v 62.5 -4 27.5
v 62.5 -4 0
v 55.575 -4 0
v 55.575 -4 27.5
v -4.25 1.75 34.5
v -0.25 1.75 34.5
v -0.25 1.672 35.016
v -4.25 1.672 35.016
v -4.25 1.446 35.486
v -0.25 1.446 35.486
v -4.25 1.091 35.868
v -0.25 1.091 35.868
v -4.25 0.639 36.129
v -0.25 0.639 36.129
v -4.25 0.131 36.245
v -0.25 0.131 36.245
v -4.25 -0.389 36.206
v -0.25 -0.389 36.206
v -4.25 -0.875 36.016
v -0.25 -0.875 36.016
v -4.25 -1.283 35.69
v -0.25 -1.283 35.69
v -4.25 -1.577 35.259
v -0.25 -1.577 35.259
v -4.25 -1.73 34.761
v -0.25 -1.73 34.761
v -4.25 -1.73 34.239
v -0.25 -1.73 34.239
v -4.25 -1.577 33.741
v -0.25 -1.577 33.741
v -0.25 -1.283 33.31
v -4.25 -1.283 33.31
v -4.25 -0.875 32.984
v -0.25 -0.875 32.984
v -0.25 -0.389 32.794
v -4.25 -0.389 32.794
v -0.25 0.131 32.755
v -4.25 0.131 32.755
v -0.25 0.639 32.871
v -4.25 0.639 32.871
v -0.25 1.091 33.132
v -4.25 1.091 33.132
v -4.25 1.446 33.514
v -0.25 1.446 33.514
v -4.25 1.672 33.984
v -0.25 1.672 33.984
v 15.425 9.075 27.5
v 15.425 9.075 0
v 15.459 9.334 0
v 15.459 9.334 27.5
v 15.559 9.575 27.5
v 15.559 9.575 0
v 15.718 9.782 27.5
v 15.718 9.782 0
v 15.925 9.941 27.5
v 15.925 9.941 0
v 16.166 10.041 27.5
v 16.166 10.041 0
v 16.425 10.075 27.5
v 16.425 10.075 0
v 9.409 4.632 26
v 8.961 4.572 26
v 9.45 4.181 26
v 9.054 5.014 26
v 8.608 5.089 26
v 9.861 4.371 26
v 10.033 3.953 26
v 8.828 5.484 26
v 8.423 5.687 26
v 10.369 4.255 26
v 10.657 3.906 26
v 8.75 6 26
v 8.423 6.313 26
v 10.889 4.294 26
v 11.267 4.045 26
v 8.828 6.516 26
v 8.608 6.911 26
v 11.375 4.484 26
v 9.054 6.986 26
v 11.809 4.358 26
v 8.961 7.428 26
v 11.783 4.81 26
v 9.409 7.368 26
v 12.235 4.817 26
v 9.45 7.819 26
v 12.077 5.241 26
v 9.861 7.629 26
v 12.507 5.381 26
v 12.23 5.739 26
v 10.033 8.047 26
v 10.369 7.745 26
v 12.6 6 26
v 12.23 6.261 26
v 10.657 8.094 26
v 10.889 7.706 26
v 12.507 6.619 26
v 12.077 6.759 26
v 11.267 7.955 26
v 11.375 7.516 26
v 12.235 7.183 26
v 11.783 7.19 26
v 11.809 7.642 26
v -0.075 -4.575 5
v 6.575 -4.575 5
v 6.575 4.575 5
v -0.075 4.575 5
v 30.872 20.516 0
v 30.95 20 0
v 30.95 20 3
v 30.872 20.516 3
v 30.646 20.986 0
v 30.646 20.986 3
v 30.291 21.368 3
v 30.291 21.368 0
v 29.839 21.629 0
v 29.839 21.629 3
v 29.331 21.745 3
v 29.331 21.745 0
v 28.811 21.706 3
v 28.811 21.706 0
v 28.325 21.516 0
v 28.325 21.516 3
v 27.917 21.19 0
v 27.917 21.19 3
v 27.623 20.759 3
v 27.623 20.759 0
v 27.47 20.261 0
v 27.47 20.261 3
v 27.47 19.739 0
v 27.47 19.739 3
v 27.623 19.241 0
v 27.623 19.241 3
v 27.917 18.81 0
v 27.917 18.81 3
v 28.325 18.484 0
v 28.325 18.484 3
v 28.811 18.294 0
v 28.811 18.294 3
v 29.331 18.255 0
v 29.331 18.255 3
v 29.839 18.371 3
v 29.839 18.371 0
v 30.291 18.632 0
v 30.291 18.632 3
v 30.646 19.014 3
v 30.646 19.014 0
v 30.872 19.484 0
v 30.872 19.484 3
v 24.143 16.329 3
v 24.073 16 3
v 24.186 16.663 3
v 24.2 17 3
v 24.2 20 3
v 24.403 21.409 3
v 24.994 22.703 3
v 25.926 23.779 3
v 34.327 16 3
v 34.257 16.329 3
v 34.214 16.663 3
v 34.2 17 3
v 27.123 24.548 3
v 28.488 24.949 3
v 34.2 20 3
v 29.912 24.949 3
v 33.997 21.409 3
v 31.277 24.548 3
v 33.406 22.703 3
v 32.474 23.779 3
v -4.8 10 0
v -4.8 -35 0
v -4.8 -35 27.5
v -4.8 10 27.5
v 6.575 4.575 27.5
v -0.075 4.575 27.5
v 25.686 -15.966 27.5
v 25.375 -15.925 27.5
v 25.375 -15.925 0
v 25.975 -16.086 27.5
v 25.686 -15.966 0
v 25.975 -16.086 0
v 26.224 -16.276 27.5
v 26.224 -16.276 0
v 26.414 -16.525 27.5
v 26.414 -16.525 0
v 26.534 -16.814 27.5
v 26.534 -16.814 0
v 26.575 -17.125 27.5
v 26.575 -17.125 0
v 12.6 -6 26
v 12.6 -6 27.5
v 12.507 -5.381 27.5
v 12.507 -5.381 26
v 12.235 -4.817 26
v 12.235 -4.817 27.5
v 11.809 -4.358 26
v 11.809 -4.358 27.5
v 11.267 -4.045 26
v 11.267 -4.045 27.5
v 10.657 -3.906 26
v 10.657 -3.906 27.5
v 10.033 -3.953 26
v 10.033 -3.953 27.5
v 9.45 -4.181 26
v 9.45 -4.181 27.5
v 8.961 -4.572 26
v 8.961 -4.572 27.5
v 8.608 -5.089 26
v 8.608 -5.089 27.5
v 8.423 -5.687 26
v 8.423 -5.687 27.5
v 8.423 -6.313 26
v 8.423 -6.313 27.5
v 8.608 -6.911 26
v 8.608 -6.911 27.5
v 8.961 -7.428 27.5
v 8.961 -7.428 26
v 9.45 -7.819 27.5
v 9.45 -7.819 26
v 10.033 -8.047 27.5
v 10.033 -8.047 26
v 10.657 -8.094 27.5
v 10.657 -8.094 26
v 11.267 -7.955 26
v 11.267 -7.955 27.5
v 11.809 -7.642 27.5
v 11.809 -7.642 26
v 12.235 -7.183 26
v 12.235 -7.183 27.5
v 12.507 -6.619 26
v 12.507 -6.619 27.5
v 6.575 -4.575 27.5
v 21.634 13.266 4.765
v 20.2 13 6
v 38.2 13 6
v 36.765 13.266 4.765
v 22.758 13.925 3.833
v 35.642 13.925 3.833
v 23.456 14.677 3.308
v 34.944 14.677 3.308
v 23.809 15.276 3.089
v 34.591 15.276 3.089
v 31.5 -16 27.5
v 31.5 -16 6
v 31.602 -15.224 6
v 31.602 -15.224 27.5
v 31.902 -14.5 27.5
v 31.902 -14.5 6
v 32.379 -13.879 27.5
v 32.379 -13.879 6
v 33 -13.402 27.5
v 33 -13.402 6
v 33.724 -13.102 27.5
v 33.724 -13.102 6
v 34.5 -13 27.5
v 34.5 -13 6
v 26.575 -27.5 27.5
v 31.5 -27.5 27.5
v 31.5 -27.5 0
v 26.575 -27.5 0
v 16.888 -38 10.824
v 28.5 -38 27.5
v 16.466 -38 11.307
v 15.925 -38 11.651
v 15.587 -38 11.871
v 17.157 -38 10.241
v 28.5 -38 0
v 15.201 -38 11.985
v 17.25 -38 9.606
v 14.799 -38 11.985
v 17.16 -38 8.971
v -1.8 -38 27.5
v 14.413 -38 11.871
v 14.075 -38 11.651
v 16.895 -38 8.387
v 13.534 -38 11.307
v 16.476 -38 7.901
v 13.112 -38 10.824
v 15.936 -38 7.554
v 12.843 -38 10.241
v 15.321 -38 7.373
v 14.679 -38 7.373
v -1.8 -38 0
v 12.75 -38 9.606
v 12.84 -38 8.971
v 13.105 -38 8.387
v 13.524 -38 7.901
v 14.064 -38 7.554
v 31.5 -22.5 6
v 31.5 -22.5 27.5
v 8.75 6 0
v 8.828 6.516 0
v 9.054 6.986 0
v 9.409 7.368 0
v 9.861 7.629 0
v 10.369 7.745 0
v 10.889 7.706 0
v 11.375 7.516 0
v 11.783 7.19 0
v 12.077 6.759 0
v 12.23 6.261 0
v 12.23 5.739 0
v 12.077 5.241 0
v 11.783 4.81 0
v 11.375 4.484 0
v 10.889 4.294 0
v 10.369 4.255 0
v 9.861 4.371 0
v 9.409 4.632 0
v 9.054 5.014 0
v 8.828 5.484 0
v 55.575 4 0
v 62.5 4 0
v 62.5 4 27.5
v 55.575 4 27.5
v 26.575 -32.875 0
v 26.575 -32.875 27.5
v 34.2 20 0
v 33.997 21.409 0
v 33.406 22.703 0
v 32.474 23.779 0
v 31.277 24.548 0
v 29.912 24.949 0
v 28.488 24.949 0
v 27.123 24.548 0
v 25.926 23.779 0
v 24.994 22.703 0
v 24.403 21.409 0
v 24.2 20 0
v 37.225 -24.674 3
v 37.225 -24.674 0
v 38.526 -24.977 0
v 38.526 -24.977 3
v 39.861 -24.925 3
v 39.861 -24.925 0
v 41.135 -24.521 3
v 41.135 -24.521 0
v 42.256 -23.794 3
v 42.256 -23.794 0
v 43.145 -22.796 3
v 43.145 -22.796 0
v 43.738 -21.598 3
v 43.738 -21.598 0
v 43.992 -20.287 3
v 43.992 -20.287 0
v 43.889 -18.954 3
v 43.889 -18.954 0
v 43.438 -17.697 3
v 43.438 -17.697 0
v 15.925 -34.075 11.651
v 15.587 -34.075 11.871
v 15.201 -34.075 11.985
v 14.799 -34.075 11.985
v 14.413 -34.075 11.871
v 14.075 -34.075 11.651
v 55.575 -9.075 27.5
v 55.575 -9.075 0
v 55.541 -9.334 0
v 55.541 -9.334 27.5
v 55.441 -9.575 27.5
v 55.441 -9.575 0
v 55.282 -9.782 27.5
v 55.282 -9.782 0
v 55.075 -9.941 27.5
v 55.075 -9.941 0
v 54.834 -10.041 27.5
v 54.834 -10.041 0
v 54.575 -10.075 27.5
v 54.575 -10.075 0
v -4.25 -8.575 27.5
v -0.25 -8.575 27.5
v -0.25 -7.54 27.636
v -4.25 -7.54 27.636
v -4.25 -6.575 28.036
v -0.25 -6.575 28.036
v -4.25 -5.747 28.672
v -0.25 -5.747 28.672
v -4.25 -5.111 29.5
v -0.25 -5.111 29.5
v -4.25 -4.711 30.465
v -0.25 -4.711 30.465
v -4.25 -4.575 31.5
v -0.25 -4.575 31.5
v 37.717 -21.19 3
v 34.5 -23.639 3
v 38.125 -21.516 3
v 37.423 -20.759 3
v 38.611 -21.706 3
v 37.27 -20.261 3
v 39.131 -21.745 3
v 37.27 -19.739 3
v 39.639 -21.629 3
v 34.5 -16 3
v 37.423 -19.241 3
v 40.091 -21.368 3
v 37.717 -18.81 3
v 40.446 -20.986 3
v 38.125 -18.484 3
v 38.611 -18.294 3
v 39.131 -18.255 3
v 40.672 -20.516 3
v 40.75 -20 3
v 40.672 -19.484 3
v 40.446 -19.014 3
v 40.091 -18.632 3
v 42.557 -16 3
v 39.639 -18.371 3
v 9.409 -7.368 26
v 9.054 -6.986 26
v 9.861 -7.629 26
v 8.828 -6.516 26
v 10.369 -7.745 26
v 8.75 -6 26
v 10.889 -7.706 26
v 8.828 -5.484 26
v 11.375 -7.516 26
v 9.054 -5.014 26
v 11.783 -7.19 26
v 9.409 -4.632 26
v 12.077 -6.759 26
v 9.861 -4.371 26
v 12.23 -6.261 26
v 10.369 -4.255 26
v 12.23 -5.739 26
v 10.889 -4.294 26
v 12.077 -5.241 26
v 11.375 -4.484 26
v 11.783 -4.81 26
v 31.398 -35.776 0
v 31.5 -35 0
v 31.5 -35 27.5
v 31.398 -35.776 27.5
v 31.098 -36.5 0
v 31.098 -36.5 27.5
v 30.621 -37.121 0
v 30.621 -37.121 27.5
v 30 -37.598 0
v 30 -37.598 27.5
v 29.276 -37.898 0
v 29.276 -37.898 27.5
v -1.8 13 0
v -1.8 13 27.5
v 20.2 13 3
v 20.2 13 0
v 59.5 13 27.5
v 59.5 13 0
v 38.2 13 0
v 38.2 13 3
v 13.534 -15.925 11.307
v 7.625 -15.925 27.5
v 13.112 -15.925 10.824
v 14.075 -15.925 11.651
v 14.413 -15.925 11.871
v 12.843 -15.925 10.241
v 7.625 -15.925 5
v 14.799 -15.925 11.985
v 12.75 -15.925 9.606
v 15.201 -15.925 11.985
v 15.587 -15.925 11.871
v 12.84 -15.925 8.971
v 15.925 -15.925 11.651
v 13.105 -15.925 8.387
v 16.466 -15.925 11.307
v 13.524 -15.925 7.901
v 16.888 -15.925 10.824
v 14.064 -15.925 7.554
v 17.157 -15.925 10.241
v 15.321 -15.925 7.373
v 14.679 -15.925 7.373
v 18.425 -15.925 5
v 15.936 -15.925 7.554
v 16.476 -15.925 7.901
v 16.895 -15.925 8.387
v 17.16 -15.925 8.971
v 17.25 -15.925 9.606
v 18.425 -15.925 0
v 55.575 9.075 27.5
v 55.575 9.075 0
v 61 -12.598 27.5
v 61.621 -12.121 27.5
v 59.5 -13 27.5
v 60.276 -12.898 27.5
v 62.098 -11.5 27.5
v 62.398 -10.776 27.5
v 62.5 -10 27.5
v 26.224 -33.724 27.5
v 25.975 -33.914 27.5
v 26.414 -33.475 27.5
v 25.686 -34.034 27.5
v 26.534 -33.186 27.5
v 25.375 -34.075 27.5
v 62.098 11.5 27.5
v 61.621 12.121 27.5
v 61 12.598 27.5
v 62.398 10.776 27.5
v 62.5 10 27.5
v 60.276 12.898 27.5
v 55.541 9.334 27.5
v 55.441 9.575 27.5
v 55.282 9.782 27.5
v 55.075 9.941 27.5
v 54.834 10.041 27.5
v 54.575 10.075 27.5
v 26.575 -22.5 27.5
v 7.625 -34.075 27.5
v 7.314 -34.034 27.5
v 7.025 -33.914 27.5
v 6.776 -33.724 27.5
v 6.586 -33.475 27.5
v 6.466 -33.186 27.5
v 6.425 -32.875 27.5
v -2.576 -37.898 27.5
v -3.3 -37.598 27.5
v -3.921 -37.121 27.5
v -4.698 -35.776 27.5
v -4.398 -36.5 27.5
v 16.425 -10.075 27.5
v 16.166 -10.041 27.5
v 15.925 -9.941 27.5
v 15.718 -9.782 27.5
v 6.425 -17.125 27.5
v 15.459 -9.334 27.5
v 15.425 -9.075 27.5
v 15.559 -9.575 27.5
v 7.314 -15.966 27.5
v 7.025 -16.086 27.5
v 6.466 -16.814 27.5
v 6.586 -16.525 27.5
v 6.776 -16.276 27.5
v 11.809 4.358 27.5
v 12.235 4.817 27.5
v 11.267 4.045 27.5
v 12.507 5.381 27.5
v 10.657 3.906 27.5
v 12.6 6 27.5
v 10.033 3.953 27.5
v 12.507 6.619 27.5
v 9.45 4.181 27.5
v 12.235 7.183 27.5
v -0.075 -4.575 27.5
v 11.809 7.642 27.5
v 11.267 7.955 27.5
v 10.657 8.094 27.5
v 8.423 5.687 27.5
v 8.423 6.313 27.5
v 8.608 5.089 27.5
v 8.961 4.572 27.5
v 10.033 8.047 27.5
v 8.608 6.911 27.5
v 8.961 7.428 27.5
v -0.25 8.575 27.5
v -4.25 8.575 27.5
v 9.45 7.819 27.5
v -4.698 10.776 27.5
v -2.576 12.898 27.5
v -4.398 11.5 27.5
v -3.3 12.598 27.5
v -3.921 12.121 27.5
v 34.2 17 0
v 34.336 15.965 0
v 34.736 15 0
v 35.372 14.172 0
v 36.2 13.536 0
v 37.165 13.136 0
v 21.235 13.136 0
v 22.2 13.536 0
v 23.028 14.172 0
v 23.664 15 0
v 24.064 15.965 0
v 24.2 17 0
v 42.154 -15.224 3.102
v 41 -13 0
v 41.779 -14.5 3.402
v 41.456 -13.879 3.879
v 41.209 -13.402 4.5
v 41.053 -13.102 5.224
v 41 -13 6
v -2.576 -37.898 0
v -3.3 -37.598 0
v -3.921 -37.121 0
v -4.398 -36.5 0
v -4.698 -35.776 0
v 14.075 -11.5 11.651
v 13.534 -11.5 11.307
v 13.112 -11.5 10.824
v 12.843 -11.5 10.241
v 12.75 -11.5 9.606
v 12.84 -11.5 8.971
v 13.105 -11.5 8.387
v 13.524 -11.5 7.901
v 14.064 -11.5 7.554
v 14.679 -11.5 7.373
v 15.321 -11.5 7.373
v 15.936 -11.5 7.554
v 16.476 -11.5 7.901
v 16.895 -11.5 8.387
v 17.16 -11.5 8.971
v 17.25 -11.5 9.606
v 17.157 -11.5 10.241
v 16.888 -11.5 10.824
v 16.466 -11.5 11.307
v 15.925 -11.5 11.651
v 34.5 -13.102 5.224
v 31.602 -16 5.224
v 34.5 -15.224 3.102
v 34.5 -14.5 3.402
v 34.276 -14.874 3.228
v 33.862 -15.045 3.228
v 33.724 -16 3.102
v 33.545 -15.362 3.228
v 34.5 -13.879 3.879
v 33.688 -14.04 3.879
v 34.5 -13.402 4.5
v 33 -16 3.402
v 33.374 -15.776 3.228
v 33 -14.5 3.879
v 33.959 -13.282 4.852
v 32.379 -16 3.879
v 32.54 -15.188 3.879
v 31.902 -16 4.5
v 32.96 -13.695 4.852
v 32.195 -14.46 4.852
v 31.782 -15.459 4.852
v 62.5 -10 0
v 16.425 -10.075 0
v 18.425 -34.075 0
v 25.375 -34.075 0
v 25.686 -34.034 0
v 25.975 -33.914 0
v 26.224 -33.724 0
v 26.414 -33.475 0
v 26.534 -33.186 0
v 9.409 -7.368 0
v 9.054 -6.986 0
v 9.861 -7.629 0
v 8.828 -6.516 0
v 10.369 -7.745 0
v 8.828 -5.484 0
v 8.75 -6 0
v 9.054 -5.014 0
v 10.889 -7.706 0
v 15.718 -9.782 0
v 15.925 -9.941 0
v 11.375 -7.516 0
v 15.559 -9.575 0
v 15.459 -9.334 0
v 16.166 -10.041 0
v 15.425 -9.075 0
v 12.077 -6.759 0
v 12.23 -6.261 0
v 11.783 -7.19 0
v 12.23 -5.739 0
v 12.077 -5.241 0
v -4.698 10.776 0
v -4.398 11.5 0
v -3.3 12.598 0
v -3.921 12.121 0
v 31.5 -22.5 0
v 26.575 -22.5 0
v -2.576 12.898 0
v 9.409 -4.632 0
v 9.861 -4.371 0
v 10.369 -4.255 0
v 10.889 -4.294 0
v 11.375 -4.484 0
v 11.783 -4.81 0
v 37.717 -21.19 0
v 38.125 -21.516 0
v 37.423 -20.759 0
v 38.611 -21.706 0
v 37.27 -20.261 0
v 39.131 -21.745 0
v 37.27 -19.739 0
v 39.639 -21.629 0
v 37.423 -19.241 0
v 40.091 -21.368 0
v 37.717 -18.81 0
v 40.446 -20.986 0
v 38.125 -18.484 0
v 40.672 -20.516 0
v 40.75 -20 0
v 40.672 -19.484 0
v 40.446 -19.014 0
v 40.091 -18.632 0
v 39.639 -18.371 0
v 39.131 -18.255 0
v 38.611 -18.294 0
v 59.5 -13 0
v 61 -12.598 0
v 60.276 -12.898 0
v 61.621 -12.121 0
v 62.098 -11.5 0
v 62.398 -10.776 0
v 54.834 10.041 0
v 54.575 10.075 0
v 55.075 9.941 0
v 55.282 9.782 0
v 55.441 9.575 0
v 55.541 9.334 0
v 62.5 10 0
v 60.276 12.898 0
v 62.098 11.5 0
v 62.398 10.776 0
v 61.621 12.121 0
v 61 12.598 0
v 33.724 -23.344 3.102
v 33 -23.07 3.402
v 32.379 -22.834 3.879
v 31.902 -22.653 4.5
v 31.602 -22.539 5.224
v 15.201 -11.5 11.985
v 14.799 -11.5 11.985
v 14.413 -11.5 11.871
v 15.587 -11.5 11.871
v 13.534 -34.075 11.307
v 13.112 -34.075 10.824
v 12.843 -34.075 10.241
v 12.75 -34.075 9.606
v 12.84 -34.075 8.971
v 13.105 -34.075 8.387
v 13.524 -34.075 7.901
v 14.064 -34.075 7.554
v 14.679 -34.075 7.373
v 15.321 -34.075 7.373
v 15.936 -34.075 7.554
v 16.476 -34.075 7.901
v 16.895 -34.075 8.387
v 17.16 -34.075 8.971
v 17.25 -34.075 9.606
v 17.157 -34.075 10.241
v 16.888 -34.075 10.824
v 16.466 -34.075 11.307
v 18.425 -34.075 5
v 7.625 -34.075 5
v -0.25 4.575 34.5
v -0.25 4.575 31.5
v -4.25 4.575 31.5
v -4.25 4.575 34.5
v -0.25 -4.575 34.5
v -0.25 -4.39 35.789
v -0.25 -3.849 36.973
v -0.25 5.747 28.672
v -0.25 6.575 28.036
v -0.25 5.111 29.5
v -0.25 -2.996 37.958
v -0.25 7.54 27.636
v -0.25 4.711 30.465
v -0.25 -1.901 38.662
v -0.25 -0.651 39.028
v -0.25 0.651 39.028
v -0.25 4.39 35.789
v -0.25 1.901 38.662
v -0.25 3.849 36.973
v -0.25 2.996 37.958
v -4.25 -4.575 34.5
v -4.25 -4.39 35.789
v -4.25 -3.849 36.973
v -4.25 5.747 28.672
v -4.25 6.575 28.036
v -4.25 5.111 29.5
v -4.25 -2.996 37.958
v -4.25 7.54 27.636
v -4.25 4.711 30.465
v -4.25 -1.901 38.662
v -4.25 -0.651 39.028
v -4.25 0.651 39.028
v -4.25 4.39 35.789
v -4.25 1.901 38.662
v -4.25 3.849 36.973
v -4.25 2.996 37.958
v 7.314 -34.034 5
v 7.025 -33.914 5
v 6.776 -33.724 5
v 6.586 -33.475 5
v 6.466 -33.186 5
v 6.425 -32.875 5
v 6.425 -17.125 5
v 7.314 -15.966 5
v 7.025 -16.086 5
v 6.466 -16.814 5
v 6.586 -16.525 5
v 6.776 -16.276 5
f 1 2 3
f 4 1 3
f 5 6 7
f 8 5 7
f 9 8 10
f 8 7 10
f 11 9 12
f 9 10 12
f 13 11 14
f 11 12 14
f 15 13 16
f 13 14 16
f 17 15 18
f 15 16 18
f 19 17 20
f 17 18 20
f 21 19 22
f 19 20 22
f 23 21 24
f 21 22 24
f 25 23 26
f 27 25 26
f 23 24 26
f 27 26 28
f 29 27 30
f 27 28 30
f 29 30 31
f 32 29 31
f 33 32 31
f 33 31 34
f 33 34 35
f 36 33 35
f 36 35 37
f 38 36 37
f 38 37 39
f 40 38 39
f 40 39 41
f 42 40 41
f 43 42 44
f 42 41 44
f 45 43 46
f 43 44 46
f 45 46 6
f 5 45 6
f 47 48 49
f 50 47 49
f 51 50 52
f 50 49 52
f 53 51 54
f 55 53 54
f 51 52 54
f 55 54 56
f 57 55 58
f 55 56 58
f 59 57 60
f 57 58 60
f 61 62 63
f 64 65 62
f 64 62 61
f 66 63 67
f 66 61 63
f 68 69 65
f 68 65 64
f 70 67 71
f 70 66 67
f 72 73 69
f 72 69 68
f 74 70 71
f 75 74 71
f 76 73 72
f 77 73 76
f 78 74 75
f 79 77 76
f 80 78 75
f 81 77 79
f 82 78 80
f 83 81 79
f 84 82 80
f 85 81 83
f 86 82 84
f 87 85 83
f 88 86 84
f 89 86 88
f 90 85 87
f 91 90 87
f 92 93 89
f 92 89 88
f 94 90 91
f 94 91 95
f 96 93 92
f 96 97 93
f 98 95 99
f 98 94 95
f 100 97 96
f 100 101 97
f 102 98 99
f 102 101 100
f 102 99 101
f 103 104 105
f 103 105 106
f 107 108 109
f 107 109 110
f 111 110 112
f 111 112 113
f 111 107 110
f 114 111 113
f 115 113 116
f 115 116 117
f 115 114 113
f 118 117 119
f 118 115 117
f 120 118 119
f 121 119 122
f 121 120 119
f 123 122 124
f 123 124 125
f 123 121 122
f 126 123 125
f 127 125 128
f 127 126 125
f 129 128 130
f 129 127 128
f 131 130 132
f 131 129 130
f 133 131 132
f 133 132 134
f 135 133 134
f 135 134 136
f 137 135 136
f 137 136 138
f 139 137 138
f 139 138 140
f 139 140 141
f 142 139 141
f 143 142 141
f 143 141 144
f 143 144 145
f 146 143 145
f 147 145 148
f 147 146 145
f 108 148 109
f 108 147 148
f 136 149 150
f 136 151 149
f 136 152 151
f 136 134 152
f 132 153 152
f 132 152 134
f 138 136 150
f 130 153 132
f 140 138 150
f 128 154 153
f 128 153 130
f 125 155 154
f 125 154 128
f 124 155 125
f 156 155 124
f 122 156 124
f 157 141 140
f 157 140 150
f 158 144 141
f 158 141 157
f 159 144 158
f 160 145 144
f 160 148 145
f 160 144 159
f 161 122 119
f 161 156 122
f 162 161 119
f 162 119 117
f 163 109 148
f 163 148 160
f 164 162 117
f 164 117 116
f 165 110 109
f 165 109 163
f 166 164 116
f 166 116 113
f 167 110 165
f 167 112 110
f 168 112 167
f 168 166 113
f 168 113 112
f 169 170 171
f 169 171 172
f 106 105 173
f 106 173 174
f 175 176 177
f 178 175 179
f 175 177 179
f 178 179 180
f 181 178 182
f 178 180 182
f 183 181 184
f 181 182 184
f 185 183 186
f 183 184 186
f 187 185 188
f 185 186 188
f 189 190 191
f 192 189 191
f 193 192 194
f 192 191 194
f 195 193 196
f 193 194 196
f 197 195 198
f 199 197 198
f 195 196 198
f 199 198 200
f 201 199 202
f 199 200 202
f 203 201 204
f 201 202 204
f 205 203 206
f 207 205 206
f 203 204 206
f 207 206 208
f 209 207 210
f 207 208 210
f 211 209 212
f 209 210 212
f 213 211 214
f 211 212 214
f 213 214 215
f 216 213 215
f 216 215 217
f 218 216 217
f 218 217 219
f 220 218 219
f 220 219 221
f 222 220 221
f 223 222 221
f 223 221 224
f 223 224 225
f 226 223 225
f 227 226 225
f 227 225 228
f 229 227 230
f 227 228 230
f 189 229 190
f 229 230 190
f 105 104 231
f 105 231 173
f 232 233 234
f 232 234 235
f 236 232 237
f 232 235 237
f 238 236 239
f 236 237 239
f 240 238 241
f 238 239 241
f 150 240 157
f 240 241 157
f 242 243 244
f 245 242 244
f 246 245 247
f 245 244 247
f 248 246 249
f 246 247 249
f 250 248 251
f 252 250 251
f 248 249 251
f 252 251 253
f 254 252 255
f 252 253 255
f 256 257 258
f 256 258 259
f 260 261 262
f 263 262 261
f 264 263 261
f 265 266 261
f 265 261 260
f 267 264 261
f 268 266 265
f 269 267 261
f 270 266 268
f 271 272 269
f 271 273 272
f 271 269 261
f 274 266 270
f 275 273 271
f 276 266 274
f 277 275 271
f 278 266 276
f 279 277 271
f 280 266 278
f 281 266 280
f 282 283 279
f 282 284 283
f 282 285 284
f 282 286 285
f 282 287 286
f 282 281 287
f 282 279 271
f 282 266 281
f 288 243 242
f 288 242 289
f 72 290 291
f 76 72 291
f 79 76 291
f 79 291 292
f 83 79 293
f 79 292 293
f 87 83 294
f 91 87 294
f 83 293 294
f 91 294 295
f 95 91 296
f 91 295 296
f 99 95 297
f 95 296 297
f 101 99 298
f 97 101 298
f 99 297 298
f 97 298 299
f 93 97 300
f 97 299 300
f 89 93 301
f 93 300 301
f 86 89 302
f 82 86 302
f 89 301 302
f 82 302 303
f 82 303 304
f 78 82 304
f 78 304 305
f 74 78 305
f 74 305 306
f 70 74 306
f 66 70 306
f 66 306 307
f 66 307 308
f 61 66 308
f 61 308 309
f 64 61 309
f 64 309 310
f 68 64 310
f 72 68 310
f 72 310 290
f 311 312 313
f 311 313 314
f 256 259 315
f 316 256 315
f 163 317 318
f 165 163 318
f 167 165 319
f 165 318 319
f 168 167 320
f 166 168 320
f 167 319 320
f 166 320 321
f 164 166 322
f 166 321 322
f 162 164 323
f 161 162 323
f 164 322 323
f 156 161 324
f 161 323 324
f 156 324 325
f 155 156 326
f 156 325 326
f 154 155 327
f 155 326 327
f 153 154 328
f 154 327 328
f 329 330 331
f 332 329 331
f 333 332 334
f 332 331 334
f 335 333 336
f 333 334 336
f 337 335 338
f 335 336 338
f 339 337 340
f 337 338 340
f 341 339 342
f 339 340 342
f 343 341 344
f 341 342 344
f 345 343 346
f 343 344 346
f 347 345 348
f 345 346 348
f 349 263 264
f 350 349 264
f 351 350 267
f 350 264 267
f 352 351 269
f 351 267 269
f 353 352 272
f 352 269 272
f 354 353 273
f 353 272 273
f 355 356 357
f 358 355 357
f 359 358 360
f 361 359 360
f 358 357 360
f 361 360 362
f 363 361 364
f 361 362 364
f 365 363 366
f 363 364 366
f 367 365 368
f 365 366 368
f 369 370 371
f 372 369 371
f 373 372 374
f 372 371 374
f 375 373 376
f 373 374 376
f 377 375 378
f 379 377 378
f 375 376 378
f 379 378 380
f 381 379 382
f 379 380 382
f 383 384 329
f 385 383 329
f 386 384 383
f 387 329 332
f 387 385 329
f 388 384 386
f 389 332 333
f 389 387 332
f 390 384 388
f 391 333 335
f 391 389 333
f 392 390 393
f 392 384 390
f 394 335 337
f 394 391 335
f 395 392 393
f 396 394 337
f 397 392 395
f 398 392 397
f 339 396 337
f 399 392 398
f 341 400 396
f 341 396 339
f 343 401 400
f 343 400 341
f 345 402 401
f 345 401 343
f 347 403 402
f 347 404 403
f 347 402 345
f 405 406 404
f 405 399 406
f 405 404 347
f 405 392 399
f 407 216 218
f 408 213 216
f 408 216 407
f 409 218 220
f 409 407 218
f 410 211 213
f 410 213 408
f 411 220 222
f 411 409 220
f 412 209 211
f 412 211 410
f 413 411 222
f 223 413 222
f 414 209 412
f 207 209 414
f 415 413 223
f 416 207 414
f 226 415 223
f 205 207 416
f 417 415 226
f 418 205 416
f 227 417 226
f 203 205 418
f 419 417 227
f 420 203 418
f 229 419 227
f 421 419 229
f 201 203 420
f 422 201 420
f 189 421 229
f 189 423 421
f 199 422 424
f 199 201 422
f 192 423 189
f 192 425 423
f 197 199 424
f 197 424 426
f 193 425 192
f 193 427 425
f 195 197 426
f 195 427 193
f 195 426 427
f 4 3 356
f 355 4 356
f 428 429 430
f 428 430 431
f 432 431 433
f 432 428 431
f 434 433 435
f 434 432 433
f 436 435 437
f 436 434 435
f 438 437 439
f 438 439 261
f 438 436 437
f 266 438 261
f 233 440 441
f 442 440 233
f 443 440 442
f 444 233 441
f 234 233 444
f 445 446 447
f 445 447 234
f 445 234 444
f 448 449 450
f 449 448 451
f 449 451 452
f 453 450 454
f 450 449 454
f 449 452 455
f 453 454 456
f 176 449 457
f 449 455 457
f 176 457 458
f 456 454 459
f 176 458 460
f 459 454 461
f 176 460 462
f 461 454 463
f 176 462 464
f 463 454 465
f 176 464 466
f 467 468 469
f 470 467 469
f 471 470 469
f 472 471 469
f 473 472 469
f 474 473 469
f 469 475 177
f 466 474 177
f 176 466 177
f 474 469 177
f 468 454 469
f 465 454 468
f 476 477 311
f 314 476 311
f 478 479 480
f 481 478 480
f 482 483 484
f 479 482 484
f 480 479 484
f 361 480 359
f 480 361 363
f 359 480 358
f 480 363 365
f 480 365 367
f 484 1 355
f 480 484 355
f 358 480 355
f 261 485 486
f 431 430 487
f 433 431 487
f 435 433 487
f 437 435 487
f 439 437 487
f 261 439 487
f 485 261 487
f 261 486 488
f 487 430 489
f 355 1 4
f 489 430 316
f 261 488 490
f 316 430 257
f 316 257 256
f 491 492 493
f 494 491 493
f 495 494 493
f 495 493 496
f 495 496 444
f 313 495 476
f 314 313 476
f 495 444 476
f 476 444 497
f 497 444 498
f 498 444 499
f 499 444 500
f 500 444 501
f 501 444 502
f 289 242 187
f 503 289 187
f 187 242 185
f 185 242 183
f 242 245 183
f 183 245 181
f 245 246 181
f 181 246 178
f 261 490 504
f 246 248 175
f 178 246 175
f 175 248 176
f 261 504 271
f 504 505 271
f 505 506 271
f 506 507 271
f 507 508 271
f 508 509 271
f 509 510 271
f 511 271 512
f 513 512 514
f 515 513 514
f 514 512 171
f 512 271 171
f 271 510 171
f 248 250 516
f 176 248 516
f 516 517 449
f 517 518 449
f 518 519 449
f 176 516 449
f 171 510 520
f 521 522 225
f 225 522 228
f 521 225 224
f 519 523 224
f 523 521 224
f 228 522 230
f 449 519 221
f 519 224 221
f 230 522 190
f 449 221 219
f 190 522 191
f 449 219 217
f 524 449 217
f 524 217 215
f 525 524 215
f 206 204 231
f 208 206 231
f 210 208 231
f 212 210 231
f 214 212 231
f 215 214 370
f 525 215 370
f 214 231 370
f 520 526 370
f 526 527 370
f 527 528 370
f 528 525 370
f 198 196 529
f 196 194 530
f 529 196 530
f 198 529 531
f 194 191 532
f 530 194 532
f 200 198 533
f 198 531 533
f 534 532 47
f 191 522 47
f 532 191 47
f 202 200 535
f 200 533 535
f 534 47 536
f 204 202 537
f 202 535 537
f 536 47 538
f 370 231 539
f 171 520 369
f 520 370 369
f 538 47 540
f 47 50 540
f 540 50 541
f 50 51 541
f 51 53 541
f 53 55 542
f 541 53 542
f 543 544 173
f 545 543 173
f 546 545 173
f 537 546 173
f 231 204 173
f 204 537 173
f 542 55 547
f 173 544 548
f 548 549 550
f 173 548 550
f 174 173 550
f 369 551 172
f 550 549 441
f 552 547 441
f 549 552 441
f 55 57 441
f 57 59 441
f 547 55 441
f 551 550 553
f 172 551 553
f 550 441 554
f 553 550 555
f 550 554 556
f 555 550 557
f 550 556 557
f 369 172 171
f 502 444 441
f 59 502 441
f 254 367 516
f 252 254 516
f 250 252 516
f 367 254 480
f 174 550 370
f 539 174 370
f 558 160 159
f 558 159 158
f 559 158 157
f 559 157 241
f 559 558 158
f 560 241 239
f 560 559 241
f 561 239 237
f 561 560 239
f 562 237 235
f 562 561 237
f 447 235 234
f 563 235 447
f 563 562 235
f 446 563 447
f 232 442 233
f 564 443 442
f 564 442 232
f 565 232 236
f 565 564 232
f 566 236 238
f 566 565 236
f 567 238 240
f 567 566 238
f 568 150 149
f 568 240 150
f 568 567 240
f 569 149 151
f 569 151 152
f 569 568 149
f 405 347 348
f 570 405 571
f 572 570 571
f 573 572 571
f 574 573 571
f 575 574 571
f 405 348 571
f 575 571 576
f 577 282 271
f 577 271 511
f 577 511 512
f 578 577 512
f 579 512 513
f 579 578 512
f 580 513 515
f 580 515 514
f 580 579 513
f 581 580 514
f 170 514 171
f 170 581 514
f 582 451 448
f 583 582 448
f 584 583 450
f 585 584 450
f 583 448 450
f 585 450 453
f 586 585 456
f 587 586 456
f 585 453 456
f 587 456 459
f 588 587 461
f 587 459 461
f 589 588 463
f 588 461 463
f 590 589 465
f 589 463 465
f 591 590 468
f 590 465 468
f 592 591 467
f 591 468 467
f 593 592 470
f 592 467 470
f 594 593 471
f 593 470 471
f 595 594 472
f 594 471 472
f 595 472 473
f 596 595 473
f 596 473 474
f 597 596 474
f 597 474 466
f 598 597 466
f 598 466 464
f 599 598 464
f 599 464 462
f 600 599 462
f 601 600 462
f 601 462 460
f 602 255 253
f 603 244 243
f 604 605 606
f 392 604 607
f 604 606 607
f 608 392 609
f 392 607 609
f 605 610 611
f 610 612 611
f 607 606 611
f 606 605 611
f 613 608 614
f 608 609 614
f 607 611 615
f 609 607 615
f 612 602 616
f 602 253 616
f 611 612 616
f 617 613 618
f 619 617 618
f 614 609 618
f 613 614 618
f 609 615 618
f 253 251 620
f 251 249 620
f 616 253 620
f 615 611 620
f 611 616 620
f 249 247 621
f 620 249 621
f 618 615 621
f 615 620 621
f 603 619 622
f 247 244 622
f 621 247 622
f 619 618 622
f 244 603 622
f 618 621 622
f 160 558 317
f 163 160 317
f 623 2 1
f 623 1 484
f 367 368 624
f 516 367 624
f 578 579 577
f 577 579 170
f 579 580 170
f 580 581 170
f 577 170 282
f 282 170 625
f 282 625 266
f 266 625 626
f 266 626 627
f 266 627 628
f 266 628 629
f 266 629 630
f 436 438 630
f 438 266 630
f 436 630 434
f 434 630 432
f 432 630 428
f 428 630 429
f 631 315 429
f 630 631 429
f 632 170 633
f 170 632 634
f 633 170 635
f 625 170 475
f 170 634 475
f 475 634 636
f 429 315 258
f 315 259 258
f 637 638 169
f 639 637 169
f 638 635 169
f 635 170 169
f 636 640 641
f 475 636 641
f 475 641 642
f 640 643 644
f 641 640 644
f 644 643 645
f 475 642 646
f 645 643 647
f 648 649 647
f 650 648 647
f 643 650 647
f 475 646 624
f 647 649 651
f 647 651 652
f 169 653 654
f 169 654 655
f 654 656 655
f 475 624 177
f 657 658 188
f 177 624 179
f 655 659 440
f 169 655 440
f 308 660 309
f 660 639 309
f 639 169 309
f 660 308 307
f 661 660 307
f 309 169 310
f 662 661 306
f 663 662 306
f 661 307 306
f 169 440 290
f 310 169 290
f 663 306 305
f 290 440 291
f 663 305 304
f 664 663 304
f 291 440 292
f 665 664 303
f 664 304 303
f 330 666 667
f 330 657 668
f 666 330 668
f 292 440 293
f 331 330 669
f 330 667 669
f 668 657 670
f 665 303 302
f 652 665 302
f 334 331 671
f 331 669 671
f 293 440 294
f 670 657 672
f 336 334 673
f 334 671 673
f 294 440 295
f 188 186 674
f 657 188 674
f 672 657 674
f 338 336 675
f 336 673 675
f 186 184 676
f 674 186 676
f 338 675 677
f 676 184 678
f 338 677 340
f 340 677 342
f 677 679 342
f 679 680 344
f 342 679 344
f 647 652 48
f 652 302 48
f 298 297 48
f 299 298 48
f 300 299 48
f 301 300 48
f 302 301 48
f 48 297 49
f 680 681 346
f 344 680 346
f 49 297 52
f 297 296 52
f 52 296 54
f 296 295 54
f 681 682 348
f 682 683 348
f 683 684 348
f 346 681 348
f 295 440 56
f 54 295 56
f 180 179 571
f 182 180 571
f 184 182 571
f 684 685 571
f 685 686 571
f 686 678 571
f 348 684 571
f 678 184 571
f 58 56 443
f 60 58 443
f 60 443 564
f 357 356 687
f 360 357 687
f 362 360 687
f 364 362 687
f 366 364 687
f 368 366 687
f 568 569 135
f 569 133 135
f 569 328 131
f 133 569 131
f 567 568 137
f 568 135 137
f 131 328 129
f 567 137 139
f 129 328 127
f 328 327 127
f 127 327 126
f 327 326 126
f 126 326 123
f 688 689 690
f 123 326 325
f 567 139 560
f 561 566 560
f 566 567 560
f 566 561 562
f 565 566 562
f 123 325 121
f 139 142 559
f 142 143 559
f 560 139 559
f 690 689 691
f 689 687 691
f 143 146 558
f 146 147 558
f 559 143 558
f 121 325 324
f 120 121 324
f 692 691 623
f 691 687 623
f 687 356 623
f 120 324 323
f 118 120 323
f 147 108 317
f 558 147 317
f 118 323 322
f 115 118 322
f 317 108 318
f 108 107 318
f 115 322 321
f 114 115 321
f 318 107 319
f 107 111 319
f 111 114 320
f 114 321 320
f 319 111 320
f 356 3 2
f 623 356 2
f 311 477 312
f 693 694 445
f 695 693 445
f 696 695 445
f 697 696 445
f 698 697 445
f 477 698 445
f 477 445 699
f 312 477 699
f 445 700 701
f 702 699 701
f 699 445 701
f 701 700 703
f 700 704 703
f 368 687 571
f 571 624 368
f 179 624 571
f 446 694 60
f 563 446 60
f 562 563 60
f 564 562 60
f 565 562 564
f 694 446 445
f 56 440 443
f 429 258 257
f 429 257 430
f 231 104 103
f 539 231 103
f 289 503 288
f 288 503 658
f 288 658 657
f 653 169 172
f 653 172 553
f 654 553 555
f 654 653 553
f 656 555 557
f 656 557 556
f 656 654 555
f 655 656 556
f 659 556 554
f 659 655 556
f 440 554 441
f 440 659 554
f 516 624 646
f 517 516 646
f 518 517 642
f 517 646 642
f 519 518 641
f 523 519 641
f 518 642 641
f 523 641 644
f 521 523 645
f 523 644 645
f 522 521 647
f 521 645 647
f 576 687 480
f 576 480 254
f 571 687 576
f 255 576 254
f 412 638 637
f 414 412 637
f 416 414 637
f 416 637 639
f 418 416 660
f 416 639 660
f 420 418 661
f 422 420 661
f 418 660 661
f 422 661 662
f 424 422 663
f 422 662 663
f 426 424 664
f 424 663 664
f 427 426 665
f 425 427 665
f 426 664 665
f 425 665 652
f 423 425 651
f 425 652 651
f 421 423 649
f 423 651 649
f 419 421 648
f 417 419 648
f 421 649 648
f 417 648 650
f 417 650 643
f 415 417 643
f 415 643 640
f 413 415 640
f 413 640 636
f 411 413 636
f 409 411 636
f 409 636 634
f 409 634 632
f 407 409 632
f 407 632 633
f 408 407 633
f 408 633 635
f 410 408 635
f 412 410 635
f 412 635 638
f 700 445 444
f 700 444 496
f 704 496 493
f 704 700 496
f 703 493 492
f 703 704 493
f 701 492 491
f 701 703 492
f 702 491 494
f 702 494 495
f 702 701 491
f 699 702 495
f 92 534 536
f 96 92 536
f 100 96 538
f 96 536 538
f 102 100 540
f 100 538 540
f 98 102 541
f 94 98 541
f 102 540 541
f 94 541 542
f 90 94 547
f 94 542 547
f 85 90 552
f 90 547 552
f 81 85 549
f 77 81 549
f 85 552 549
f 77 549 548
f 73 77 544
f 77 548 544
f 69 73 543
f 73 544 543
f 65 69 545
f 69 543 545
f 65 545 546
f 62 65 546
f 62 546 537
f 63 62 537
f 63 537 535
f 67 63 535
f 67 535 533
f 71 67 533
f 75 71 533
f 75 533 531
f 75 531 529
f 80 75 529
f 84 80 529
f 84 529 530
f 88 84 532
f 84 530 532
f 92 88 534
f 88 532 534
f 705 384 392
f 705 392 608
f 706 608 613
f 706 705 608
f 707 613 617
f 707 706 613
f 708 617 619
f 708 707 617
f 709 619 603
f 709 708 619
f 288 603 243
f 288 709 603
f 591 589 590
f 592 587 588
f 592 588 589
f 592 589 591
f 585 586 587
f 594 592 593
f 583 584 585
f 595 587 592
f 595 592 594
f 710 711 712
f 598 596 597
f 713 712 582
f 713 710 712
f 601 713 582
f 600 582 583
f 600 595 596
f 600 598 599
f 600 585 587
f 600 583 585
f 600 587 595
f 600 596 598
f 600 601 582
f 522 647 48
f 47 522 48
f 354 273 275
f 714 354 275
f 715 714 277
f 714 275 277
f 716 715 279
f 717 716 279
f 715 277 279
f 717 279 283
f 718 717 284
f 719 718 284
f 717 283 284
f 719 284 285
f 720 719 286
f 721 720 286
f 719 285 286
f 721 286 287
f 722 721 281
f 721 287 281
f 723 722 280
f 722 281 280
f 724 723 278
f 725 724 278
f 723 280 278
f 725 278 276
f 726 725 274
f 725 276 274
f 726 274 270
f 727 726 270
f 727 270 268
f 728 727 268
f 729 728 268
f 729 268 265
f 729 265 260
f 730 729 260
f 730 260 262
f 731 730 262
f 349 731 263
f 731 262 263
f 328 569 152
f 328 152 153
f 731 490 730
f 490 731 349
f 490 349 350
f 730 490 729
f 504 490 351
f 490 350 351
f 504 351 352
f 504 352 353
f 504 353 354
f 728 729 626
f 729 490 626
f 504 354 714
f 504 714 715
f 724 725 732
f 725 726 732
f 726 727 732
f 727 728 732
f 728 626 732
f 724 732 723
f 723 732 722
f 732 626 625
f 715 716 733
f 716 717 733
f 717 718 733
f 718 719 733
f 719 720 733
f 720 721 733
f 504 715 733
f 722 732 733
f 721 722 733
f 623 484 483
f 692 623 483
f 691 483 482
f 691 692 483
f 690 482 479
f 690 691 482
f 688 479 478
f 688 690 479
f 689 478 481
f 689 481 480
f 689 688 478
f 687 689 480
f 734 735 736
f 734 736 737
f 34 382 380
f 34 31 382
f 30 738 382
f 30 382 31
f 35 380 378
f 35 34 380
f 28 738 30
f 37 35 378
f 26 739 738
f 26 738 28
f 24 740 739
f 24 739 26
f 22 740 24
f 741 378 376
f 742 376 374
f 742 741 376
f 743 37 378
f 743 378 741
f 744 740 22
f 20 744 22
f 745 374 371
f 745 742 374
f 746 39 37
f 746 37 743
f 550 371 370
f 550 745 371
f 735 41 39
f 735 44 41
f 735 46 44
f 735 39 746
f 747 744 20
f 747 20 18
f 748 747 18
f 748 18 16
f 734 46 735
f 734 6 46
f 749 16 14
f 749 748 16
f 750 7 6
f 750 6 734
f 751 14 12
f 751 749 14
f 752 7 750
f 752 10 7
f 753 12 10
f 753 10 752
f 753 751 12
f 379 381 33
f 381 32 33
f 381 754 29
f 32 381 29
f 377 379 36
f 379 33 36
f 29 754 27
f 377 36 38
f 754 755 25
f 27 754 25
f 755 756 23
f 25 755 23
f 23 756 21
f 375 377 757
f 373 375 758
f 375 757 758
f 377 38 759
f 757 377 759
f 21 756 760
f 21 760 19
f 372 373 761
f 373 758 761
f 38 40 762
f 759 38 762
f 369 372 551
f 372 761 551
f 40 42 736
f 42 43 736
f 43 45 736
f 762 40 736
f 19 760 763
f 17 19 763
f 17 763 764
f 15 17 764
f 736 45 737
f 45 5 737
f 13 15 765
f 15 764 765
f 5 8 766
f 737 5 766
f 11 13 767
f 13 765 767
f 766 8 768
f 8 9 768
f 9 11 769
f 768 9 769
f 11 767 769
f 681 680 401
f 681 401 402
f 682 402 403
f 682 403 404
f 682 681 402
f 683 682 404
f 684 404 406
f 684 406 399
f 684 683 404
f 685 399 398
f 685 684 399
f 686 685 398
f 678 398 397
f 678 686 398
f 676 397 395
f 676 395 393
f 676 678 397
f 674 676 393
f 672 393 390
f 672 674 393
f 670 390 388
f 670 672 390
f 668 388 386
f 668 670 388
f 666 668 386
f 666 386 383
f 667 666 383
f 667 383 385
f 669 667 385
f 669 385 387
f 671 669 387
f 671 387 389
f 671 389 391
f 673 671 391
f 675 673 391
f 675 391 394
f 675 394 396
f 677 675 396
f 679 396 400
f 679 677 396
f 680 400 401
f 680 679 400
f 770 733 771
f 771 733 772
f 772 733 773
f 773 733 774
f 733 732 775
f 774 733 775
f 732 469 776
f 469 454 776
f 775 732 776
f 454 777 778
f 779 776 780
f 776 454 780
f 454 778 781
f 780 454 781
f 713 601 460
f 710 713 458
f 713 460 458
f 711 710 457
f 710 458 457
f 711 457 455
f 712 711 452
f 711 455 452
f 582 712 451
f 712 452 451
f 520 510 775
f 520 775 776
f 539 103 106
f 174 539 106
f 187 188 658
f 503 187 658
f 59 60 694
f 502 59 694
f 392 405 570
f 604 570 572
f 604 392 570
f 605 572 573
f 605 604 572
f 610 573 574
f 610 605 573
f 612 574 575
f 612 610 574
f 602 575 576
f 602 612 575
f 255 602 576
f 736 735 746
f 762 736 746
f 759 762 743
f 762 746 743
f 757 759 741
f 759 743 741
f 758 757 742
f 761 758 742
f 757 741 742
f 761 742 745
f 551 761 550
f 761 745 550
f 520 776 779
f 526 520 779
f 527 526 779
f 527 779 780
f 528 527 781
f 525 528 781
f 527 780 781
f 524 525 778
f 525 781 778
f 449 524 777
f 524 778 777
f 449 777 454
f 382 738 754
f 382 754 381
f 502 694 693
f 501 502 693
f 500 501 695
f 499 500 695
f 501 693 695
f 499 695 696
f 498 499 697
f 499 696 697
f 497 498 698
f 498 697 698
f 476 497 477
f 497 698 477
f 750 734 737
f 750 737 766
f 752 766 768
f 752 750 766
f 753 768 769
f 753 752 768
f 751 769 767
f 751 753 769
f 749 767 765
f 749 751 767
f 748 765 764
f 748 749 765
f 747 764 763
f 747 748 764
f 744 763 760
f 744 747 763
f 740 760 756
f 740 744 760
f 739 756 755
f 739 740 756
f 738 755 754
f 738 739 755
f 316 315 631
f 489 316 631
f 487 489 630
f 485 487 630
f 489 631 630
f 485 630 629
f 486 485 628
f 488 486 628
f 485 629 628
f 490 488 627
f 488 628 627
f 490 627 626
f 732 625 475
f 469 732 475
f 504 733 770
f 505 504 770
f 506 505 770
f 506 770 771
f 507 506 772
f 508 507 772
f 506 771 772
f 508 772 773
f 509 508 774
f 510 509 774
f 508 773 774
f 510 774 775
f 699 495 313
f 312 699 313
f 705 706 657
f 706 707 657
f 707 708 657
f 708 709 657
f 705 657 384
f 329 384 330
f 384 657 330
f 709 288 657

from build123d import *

# Parameters (mm, degrees)
SKETCH042_R     = 1.75
SKETCH042_W     = 6.65
SKETCH042_H     = 9.15
PAD015_DEPTH    = 27.5
SKETCH055_W     = 6.65
SKETCH055_H     = 9.15
SKETCH055_W_2   = 12
SKETCH055_H_2   = 18.15
PAD023_DEPTH    = 5
SKETCH056_R     = 1.75
PAD024_DEPTH    = 4
SKETCH057_R     = 1.75
PAD025_DEPTH    = 3
POCKET028_DEPTH = 13.5
SKETCH059_R     = 2.1
POCKET029_DEPTH = 1.5
FILLET_R        = 3


with BuildPart() as part:
    # Sketch042 → Pad015 (new body)
    with BuildSketch(Plane(origin=(0, 0, 0), x_dir=(-1, 0, 0), z_dir=(0, 0, -1))):
        with BuildLine():
            Line((-28.5, -38), (1.8, -38))
            ThreePointArc((1.8, -38), (3.9213203436, -37.1213203436), (4.8, -35))
            Line((4.8, -35), (4.8, 10))
            ThreePointArc((4.8, 10), (3.9213203436, 12.1213203436), (1.8, 13))
            Line((1.8, 13), (-59.5, 13))
            ThreePointArc((-59.5, 13), (-61.6213203436, 12.1213203436), (-62.5, 10))
            Line((-62.5, 10), (-62.5, 4))
            Line((-62.5, 4), (-55.575, 4))
            Line((-55.575, 9.075), (-55.575, 4))
            ThreePointArc((-54.575, 10.075), (-55.2821067812, 9.7821067812), (-55.575, 9.075))
            Line((-16.425, 10.075), (-54.575, 10.075))
            ThreePointArc((-15.425, 9.075), (-15.7178932188, 9.7821067812), (-16.425, 10.075))
            Line((-15.425, -9.075), (-15.425, 9.075))
            ThreePointArc((-16.425, -10.075), (-15.7178932188, -9.7821067812), (-15.425, -9.075))
            Line((-54.575, -10.075), (-16.425, -10.075))
            ThreePointArc((-55.575, -9.075), (-55.2821067812, -9.7821067812), (-54.575, -10.075))
            Line((-55.575, -4), (-55.575, -9.075))
            Line((-62.5, -4), (-55.575, -4))
            Line((-62.5, -4), (-62.5, -10))
            ThreePointArc((-62.5, -10), (-61.6213203436, -12.1213203436), (-59.5, -13))
            Line((-59.5, -13), (-34.5, -13))
            ThreePointArc((-31.5, -16), (-32.3786796564, -13.8786796564), (-34.5, -13))
            Line((-31.5, -16), (-31.5, -22.5))
            Line((-26.575, -22.5), (-31.5, -22.5))
            Line((-26.575, -17.125), (-26.575, -22.5))
            ThreePointArc((-25.375, -15.925), (-26.2235281374, -16.2764718626), (-26.575, -17.125))
            Line((-7.625, -15.925), (-25.375, -15.925))
            ThreePointArc((-6.425, -17.125), (-6.7764718626, -16.2764718626), (-7.625, -15.925))
            Line((-6.425, -32.875), (-6.425, -17.125))
            ThreePointArc((-7.625, -34.075), (-6.7764718626, -33.7235281374), (-6.425, -32.875))
            Line((-25.375, -34.075), (-7.625, -34.075))
            ThreePointArc((-26.575, -32.875), (-26.2235281374, -33.7235281374), (-25.375, -34.075))
            Line((-26.575, -27.5), (-26.575, -32.875))
            Line((-31.5, -27.5), (-26.575, -27.5))
            Line((-31.5, -27.5), (-31.5, -35))
            ThreePointArc((-31.5, -35), (-30.6213203436, -37.1213203436), (-28.5, -38))
        make_face()
        with Locations((-10.5, 6)):
            Circle(SKETCH042_R, mode=Mode.SUBTRACT)
        with Locations((-10.5, -6)):
            Circle(SKETCH042_R, mode=Mode.SUBTRACT)
        with Locations((-3.25, 0)):
            Rectangle(SKETCH042_W, SKETCH042_H, mode=Mode.SUBTRACT)
    extrude(amount=-PAD015_DEPTH)

    # Sketch055 → Pad023 (join)
    with BuildSketch(Plane(origin=(0, 0, 0), x_dir=(-1, 0, 0), z_dir=(0, 0, -1))):
        with Locations((-3.25, 0)):
            Rectangle(SKETCH055_W, SKETCH055_H)
        with Locations((-12.425, -25)):
            Rectangle(SKETCH055_W_2, SKETCH055_H_2)
    extrude(amount=-PAD023_DEPTH)

    # Sketch056 → Pad024 (join)
    with BuildSketch(Plane.YZ.offset(-0.25)):
        with BuildLine():
            Line((-8.575, 27.5), (8.575, 27.5))
            ThreePointArc((4.575, 31.5), (5.7465728753, 28.6715728753), (8.575, 27.5))
            Line((4.575, 31.5), (4.575, 34.5))
            ThreePointArc((4.575, 34.5), (0, 39.075), (-4.575, 34.5))
            Line((-4.575, 34.5), (-4.575, 31.5))
            ThreePointArc((-8.575, 27.5), (-5.7465728753, 28.6715728753), (-4.575, 31.5))
        make_face()
        with Locations((0, 34.5)):
            Circle(SKETCH056_R, mode=Mode.SUBTRACT)
    extrude(amount=-PAD024_DEPTH)

    # Sketch057 → Pad025 (join)
    with BuildSketch(Plane.XY):
        with BuildLine():
            ThreePointArc((34.5, -13), (32.3786796564, -13.8786796564), (31.5, -16))
            Line((31.5, -16), (31.5, -22.5))
            Line((31.5, -22.5), (37.2247448714, -24.6742346142))
            ThreePointArc((37.2247448714, -24.6742346142), (42.7342236735, -23.3249922641), (43.4377847505, -17.6965099287))
            Line((43.4377847505, -17.6965099287), (41, -13))
            Line((34.5, -13), (41, -13))
        make_face()
        with Locations((39, -20)):
            Circle(SKETCH057_R, mode=Mode.SUBTRACT)
        with BuildLine():
            Line((20.2, 13), (38.2, 13))
            ThreePointArc((34.2, 17), (35.3715728753, 14.1715728753), (38.2, 13))
            Line((34.2, 17), (34.2, 20))
            ThreePointArc((34.2, 20), (29.2, 25), (24.2, 20))
            Line((24.2, 17), (24.2, 20))
            ThreePointArc((20.2, 13), (23.0284271247, 14.1715728753), (24.2, 17))
        make_face()
        with Locations((29.2, 20)):
            Circle(SKETCH057_R, mode=Mode.SUBTRACT)
    extrude(amount=PAD025_DEPTH)

    # Sketch058 → Pocket028 (cut, symmetric)
    with BuildSketch(Plane(origin=(15, -25, 9.6), x_dir=(1, 0, 0), z_dir=(0, -1, 0))):
        with BuildLine():
            ThreePointArc((-0.9245936608, 2.05125), (0, -2.25), (0.9245936608, 2.05125))
            ThreePointArc((0.9245936608, 2.05125), (0, 2.4), (-0.9245936608, 2.05125))
        make_face()
    extrude(amount=POCKET028_DEPTH, both=True, mode=Mode.SUBTRACT)

    # Sketch059 (on Face5 of Pocket028) → Pocket029 (cut)
    with BuildSketch(Plane.XY.offset(27.5)):
        with Locations((10.5, 6)):
            Circle(SKETCH059_R)
        with Locations((10.5, -6)):
            Circle(SKETCH059_R)
    extrude(amount=-POCKET029_DEPTH, mode=Mode.SUBTRACT)

    # Fillet
    fillet_edges = [part.edges().sort_by_distance(p)[0] for p in [
        (32.37868, -13.87868, 3),
        (29.2, 13, 3),
    ]]
    fillet(fillet_edges, radius=FILLET_R)


solid = part.part
